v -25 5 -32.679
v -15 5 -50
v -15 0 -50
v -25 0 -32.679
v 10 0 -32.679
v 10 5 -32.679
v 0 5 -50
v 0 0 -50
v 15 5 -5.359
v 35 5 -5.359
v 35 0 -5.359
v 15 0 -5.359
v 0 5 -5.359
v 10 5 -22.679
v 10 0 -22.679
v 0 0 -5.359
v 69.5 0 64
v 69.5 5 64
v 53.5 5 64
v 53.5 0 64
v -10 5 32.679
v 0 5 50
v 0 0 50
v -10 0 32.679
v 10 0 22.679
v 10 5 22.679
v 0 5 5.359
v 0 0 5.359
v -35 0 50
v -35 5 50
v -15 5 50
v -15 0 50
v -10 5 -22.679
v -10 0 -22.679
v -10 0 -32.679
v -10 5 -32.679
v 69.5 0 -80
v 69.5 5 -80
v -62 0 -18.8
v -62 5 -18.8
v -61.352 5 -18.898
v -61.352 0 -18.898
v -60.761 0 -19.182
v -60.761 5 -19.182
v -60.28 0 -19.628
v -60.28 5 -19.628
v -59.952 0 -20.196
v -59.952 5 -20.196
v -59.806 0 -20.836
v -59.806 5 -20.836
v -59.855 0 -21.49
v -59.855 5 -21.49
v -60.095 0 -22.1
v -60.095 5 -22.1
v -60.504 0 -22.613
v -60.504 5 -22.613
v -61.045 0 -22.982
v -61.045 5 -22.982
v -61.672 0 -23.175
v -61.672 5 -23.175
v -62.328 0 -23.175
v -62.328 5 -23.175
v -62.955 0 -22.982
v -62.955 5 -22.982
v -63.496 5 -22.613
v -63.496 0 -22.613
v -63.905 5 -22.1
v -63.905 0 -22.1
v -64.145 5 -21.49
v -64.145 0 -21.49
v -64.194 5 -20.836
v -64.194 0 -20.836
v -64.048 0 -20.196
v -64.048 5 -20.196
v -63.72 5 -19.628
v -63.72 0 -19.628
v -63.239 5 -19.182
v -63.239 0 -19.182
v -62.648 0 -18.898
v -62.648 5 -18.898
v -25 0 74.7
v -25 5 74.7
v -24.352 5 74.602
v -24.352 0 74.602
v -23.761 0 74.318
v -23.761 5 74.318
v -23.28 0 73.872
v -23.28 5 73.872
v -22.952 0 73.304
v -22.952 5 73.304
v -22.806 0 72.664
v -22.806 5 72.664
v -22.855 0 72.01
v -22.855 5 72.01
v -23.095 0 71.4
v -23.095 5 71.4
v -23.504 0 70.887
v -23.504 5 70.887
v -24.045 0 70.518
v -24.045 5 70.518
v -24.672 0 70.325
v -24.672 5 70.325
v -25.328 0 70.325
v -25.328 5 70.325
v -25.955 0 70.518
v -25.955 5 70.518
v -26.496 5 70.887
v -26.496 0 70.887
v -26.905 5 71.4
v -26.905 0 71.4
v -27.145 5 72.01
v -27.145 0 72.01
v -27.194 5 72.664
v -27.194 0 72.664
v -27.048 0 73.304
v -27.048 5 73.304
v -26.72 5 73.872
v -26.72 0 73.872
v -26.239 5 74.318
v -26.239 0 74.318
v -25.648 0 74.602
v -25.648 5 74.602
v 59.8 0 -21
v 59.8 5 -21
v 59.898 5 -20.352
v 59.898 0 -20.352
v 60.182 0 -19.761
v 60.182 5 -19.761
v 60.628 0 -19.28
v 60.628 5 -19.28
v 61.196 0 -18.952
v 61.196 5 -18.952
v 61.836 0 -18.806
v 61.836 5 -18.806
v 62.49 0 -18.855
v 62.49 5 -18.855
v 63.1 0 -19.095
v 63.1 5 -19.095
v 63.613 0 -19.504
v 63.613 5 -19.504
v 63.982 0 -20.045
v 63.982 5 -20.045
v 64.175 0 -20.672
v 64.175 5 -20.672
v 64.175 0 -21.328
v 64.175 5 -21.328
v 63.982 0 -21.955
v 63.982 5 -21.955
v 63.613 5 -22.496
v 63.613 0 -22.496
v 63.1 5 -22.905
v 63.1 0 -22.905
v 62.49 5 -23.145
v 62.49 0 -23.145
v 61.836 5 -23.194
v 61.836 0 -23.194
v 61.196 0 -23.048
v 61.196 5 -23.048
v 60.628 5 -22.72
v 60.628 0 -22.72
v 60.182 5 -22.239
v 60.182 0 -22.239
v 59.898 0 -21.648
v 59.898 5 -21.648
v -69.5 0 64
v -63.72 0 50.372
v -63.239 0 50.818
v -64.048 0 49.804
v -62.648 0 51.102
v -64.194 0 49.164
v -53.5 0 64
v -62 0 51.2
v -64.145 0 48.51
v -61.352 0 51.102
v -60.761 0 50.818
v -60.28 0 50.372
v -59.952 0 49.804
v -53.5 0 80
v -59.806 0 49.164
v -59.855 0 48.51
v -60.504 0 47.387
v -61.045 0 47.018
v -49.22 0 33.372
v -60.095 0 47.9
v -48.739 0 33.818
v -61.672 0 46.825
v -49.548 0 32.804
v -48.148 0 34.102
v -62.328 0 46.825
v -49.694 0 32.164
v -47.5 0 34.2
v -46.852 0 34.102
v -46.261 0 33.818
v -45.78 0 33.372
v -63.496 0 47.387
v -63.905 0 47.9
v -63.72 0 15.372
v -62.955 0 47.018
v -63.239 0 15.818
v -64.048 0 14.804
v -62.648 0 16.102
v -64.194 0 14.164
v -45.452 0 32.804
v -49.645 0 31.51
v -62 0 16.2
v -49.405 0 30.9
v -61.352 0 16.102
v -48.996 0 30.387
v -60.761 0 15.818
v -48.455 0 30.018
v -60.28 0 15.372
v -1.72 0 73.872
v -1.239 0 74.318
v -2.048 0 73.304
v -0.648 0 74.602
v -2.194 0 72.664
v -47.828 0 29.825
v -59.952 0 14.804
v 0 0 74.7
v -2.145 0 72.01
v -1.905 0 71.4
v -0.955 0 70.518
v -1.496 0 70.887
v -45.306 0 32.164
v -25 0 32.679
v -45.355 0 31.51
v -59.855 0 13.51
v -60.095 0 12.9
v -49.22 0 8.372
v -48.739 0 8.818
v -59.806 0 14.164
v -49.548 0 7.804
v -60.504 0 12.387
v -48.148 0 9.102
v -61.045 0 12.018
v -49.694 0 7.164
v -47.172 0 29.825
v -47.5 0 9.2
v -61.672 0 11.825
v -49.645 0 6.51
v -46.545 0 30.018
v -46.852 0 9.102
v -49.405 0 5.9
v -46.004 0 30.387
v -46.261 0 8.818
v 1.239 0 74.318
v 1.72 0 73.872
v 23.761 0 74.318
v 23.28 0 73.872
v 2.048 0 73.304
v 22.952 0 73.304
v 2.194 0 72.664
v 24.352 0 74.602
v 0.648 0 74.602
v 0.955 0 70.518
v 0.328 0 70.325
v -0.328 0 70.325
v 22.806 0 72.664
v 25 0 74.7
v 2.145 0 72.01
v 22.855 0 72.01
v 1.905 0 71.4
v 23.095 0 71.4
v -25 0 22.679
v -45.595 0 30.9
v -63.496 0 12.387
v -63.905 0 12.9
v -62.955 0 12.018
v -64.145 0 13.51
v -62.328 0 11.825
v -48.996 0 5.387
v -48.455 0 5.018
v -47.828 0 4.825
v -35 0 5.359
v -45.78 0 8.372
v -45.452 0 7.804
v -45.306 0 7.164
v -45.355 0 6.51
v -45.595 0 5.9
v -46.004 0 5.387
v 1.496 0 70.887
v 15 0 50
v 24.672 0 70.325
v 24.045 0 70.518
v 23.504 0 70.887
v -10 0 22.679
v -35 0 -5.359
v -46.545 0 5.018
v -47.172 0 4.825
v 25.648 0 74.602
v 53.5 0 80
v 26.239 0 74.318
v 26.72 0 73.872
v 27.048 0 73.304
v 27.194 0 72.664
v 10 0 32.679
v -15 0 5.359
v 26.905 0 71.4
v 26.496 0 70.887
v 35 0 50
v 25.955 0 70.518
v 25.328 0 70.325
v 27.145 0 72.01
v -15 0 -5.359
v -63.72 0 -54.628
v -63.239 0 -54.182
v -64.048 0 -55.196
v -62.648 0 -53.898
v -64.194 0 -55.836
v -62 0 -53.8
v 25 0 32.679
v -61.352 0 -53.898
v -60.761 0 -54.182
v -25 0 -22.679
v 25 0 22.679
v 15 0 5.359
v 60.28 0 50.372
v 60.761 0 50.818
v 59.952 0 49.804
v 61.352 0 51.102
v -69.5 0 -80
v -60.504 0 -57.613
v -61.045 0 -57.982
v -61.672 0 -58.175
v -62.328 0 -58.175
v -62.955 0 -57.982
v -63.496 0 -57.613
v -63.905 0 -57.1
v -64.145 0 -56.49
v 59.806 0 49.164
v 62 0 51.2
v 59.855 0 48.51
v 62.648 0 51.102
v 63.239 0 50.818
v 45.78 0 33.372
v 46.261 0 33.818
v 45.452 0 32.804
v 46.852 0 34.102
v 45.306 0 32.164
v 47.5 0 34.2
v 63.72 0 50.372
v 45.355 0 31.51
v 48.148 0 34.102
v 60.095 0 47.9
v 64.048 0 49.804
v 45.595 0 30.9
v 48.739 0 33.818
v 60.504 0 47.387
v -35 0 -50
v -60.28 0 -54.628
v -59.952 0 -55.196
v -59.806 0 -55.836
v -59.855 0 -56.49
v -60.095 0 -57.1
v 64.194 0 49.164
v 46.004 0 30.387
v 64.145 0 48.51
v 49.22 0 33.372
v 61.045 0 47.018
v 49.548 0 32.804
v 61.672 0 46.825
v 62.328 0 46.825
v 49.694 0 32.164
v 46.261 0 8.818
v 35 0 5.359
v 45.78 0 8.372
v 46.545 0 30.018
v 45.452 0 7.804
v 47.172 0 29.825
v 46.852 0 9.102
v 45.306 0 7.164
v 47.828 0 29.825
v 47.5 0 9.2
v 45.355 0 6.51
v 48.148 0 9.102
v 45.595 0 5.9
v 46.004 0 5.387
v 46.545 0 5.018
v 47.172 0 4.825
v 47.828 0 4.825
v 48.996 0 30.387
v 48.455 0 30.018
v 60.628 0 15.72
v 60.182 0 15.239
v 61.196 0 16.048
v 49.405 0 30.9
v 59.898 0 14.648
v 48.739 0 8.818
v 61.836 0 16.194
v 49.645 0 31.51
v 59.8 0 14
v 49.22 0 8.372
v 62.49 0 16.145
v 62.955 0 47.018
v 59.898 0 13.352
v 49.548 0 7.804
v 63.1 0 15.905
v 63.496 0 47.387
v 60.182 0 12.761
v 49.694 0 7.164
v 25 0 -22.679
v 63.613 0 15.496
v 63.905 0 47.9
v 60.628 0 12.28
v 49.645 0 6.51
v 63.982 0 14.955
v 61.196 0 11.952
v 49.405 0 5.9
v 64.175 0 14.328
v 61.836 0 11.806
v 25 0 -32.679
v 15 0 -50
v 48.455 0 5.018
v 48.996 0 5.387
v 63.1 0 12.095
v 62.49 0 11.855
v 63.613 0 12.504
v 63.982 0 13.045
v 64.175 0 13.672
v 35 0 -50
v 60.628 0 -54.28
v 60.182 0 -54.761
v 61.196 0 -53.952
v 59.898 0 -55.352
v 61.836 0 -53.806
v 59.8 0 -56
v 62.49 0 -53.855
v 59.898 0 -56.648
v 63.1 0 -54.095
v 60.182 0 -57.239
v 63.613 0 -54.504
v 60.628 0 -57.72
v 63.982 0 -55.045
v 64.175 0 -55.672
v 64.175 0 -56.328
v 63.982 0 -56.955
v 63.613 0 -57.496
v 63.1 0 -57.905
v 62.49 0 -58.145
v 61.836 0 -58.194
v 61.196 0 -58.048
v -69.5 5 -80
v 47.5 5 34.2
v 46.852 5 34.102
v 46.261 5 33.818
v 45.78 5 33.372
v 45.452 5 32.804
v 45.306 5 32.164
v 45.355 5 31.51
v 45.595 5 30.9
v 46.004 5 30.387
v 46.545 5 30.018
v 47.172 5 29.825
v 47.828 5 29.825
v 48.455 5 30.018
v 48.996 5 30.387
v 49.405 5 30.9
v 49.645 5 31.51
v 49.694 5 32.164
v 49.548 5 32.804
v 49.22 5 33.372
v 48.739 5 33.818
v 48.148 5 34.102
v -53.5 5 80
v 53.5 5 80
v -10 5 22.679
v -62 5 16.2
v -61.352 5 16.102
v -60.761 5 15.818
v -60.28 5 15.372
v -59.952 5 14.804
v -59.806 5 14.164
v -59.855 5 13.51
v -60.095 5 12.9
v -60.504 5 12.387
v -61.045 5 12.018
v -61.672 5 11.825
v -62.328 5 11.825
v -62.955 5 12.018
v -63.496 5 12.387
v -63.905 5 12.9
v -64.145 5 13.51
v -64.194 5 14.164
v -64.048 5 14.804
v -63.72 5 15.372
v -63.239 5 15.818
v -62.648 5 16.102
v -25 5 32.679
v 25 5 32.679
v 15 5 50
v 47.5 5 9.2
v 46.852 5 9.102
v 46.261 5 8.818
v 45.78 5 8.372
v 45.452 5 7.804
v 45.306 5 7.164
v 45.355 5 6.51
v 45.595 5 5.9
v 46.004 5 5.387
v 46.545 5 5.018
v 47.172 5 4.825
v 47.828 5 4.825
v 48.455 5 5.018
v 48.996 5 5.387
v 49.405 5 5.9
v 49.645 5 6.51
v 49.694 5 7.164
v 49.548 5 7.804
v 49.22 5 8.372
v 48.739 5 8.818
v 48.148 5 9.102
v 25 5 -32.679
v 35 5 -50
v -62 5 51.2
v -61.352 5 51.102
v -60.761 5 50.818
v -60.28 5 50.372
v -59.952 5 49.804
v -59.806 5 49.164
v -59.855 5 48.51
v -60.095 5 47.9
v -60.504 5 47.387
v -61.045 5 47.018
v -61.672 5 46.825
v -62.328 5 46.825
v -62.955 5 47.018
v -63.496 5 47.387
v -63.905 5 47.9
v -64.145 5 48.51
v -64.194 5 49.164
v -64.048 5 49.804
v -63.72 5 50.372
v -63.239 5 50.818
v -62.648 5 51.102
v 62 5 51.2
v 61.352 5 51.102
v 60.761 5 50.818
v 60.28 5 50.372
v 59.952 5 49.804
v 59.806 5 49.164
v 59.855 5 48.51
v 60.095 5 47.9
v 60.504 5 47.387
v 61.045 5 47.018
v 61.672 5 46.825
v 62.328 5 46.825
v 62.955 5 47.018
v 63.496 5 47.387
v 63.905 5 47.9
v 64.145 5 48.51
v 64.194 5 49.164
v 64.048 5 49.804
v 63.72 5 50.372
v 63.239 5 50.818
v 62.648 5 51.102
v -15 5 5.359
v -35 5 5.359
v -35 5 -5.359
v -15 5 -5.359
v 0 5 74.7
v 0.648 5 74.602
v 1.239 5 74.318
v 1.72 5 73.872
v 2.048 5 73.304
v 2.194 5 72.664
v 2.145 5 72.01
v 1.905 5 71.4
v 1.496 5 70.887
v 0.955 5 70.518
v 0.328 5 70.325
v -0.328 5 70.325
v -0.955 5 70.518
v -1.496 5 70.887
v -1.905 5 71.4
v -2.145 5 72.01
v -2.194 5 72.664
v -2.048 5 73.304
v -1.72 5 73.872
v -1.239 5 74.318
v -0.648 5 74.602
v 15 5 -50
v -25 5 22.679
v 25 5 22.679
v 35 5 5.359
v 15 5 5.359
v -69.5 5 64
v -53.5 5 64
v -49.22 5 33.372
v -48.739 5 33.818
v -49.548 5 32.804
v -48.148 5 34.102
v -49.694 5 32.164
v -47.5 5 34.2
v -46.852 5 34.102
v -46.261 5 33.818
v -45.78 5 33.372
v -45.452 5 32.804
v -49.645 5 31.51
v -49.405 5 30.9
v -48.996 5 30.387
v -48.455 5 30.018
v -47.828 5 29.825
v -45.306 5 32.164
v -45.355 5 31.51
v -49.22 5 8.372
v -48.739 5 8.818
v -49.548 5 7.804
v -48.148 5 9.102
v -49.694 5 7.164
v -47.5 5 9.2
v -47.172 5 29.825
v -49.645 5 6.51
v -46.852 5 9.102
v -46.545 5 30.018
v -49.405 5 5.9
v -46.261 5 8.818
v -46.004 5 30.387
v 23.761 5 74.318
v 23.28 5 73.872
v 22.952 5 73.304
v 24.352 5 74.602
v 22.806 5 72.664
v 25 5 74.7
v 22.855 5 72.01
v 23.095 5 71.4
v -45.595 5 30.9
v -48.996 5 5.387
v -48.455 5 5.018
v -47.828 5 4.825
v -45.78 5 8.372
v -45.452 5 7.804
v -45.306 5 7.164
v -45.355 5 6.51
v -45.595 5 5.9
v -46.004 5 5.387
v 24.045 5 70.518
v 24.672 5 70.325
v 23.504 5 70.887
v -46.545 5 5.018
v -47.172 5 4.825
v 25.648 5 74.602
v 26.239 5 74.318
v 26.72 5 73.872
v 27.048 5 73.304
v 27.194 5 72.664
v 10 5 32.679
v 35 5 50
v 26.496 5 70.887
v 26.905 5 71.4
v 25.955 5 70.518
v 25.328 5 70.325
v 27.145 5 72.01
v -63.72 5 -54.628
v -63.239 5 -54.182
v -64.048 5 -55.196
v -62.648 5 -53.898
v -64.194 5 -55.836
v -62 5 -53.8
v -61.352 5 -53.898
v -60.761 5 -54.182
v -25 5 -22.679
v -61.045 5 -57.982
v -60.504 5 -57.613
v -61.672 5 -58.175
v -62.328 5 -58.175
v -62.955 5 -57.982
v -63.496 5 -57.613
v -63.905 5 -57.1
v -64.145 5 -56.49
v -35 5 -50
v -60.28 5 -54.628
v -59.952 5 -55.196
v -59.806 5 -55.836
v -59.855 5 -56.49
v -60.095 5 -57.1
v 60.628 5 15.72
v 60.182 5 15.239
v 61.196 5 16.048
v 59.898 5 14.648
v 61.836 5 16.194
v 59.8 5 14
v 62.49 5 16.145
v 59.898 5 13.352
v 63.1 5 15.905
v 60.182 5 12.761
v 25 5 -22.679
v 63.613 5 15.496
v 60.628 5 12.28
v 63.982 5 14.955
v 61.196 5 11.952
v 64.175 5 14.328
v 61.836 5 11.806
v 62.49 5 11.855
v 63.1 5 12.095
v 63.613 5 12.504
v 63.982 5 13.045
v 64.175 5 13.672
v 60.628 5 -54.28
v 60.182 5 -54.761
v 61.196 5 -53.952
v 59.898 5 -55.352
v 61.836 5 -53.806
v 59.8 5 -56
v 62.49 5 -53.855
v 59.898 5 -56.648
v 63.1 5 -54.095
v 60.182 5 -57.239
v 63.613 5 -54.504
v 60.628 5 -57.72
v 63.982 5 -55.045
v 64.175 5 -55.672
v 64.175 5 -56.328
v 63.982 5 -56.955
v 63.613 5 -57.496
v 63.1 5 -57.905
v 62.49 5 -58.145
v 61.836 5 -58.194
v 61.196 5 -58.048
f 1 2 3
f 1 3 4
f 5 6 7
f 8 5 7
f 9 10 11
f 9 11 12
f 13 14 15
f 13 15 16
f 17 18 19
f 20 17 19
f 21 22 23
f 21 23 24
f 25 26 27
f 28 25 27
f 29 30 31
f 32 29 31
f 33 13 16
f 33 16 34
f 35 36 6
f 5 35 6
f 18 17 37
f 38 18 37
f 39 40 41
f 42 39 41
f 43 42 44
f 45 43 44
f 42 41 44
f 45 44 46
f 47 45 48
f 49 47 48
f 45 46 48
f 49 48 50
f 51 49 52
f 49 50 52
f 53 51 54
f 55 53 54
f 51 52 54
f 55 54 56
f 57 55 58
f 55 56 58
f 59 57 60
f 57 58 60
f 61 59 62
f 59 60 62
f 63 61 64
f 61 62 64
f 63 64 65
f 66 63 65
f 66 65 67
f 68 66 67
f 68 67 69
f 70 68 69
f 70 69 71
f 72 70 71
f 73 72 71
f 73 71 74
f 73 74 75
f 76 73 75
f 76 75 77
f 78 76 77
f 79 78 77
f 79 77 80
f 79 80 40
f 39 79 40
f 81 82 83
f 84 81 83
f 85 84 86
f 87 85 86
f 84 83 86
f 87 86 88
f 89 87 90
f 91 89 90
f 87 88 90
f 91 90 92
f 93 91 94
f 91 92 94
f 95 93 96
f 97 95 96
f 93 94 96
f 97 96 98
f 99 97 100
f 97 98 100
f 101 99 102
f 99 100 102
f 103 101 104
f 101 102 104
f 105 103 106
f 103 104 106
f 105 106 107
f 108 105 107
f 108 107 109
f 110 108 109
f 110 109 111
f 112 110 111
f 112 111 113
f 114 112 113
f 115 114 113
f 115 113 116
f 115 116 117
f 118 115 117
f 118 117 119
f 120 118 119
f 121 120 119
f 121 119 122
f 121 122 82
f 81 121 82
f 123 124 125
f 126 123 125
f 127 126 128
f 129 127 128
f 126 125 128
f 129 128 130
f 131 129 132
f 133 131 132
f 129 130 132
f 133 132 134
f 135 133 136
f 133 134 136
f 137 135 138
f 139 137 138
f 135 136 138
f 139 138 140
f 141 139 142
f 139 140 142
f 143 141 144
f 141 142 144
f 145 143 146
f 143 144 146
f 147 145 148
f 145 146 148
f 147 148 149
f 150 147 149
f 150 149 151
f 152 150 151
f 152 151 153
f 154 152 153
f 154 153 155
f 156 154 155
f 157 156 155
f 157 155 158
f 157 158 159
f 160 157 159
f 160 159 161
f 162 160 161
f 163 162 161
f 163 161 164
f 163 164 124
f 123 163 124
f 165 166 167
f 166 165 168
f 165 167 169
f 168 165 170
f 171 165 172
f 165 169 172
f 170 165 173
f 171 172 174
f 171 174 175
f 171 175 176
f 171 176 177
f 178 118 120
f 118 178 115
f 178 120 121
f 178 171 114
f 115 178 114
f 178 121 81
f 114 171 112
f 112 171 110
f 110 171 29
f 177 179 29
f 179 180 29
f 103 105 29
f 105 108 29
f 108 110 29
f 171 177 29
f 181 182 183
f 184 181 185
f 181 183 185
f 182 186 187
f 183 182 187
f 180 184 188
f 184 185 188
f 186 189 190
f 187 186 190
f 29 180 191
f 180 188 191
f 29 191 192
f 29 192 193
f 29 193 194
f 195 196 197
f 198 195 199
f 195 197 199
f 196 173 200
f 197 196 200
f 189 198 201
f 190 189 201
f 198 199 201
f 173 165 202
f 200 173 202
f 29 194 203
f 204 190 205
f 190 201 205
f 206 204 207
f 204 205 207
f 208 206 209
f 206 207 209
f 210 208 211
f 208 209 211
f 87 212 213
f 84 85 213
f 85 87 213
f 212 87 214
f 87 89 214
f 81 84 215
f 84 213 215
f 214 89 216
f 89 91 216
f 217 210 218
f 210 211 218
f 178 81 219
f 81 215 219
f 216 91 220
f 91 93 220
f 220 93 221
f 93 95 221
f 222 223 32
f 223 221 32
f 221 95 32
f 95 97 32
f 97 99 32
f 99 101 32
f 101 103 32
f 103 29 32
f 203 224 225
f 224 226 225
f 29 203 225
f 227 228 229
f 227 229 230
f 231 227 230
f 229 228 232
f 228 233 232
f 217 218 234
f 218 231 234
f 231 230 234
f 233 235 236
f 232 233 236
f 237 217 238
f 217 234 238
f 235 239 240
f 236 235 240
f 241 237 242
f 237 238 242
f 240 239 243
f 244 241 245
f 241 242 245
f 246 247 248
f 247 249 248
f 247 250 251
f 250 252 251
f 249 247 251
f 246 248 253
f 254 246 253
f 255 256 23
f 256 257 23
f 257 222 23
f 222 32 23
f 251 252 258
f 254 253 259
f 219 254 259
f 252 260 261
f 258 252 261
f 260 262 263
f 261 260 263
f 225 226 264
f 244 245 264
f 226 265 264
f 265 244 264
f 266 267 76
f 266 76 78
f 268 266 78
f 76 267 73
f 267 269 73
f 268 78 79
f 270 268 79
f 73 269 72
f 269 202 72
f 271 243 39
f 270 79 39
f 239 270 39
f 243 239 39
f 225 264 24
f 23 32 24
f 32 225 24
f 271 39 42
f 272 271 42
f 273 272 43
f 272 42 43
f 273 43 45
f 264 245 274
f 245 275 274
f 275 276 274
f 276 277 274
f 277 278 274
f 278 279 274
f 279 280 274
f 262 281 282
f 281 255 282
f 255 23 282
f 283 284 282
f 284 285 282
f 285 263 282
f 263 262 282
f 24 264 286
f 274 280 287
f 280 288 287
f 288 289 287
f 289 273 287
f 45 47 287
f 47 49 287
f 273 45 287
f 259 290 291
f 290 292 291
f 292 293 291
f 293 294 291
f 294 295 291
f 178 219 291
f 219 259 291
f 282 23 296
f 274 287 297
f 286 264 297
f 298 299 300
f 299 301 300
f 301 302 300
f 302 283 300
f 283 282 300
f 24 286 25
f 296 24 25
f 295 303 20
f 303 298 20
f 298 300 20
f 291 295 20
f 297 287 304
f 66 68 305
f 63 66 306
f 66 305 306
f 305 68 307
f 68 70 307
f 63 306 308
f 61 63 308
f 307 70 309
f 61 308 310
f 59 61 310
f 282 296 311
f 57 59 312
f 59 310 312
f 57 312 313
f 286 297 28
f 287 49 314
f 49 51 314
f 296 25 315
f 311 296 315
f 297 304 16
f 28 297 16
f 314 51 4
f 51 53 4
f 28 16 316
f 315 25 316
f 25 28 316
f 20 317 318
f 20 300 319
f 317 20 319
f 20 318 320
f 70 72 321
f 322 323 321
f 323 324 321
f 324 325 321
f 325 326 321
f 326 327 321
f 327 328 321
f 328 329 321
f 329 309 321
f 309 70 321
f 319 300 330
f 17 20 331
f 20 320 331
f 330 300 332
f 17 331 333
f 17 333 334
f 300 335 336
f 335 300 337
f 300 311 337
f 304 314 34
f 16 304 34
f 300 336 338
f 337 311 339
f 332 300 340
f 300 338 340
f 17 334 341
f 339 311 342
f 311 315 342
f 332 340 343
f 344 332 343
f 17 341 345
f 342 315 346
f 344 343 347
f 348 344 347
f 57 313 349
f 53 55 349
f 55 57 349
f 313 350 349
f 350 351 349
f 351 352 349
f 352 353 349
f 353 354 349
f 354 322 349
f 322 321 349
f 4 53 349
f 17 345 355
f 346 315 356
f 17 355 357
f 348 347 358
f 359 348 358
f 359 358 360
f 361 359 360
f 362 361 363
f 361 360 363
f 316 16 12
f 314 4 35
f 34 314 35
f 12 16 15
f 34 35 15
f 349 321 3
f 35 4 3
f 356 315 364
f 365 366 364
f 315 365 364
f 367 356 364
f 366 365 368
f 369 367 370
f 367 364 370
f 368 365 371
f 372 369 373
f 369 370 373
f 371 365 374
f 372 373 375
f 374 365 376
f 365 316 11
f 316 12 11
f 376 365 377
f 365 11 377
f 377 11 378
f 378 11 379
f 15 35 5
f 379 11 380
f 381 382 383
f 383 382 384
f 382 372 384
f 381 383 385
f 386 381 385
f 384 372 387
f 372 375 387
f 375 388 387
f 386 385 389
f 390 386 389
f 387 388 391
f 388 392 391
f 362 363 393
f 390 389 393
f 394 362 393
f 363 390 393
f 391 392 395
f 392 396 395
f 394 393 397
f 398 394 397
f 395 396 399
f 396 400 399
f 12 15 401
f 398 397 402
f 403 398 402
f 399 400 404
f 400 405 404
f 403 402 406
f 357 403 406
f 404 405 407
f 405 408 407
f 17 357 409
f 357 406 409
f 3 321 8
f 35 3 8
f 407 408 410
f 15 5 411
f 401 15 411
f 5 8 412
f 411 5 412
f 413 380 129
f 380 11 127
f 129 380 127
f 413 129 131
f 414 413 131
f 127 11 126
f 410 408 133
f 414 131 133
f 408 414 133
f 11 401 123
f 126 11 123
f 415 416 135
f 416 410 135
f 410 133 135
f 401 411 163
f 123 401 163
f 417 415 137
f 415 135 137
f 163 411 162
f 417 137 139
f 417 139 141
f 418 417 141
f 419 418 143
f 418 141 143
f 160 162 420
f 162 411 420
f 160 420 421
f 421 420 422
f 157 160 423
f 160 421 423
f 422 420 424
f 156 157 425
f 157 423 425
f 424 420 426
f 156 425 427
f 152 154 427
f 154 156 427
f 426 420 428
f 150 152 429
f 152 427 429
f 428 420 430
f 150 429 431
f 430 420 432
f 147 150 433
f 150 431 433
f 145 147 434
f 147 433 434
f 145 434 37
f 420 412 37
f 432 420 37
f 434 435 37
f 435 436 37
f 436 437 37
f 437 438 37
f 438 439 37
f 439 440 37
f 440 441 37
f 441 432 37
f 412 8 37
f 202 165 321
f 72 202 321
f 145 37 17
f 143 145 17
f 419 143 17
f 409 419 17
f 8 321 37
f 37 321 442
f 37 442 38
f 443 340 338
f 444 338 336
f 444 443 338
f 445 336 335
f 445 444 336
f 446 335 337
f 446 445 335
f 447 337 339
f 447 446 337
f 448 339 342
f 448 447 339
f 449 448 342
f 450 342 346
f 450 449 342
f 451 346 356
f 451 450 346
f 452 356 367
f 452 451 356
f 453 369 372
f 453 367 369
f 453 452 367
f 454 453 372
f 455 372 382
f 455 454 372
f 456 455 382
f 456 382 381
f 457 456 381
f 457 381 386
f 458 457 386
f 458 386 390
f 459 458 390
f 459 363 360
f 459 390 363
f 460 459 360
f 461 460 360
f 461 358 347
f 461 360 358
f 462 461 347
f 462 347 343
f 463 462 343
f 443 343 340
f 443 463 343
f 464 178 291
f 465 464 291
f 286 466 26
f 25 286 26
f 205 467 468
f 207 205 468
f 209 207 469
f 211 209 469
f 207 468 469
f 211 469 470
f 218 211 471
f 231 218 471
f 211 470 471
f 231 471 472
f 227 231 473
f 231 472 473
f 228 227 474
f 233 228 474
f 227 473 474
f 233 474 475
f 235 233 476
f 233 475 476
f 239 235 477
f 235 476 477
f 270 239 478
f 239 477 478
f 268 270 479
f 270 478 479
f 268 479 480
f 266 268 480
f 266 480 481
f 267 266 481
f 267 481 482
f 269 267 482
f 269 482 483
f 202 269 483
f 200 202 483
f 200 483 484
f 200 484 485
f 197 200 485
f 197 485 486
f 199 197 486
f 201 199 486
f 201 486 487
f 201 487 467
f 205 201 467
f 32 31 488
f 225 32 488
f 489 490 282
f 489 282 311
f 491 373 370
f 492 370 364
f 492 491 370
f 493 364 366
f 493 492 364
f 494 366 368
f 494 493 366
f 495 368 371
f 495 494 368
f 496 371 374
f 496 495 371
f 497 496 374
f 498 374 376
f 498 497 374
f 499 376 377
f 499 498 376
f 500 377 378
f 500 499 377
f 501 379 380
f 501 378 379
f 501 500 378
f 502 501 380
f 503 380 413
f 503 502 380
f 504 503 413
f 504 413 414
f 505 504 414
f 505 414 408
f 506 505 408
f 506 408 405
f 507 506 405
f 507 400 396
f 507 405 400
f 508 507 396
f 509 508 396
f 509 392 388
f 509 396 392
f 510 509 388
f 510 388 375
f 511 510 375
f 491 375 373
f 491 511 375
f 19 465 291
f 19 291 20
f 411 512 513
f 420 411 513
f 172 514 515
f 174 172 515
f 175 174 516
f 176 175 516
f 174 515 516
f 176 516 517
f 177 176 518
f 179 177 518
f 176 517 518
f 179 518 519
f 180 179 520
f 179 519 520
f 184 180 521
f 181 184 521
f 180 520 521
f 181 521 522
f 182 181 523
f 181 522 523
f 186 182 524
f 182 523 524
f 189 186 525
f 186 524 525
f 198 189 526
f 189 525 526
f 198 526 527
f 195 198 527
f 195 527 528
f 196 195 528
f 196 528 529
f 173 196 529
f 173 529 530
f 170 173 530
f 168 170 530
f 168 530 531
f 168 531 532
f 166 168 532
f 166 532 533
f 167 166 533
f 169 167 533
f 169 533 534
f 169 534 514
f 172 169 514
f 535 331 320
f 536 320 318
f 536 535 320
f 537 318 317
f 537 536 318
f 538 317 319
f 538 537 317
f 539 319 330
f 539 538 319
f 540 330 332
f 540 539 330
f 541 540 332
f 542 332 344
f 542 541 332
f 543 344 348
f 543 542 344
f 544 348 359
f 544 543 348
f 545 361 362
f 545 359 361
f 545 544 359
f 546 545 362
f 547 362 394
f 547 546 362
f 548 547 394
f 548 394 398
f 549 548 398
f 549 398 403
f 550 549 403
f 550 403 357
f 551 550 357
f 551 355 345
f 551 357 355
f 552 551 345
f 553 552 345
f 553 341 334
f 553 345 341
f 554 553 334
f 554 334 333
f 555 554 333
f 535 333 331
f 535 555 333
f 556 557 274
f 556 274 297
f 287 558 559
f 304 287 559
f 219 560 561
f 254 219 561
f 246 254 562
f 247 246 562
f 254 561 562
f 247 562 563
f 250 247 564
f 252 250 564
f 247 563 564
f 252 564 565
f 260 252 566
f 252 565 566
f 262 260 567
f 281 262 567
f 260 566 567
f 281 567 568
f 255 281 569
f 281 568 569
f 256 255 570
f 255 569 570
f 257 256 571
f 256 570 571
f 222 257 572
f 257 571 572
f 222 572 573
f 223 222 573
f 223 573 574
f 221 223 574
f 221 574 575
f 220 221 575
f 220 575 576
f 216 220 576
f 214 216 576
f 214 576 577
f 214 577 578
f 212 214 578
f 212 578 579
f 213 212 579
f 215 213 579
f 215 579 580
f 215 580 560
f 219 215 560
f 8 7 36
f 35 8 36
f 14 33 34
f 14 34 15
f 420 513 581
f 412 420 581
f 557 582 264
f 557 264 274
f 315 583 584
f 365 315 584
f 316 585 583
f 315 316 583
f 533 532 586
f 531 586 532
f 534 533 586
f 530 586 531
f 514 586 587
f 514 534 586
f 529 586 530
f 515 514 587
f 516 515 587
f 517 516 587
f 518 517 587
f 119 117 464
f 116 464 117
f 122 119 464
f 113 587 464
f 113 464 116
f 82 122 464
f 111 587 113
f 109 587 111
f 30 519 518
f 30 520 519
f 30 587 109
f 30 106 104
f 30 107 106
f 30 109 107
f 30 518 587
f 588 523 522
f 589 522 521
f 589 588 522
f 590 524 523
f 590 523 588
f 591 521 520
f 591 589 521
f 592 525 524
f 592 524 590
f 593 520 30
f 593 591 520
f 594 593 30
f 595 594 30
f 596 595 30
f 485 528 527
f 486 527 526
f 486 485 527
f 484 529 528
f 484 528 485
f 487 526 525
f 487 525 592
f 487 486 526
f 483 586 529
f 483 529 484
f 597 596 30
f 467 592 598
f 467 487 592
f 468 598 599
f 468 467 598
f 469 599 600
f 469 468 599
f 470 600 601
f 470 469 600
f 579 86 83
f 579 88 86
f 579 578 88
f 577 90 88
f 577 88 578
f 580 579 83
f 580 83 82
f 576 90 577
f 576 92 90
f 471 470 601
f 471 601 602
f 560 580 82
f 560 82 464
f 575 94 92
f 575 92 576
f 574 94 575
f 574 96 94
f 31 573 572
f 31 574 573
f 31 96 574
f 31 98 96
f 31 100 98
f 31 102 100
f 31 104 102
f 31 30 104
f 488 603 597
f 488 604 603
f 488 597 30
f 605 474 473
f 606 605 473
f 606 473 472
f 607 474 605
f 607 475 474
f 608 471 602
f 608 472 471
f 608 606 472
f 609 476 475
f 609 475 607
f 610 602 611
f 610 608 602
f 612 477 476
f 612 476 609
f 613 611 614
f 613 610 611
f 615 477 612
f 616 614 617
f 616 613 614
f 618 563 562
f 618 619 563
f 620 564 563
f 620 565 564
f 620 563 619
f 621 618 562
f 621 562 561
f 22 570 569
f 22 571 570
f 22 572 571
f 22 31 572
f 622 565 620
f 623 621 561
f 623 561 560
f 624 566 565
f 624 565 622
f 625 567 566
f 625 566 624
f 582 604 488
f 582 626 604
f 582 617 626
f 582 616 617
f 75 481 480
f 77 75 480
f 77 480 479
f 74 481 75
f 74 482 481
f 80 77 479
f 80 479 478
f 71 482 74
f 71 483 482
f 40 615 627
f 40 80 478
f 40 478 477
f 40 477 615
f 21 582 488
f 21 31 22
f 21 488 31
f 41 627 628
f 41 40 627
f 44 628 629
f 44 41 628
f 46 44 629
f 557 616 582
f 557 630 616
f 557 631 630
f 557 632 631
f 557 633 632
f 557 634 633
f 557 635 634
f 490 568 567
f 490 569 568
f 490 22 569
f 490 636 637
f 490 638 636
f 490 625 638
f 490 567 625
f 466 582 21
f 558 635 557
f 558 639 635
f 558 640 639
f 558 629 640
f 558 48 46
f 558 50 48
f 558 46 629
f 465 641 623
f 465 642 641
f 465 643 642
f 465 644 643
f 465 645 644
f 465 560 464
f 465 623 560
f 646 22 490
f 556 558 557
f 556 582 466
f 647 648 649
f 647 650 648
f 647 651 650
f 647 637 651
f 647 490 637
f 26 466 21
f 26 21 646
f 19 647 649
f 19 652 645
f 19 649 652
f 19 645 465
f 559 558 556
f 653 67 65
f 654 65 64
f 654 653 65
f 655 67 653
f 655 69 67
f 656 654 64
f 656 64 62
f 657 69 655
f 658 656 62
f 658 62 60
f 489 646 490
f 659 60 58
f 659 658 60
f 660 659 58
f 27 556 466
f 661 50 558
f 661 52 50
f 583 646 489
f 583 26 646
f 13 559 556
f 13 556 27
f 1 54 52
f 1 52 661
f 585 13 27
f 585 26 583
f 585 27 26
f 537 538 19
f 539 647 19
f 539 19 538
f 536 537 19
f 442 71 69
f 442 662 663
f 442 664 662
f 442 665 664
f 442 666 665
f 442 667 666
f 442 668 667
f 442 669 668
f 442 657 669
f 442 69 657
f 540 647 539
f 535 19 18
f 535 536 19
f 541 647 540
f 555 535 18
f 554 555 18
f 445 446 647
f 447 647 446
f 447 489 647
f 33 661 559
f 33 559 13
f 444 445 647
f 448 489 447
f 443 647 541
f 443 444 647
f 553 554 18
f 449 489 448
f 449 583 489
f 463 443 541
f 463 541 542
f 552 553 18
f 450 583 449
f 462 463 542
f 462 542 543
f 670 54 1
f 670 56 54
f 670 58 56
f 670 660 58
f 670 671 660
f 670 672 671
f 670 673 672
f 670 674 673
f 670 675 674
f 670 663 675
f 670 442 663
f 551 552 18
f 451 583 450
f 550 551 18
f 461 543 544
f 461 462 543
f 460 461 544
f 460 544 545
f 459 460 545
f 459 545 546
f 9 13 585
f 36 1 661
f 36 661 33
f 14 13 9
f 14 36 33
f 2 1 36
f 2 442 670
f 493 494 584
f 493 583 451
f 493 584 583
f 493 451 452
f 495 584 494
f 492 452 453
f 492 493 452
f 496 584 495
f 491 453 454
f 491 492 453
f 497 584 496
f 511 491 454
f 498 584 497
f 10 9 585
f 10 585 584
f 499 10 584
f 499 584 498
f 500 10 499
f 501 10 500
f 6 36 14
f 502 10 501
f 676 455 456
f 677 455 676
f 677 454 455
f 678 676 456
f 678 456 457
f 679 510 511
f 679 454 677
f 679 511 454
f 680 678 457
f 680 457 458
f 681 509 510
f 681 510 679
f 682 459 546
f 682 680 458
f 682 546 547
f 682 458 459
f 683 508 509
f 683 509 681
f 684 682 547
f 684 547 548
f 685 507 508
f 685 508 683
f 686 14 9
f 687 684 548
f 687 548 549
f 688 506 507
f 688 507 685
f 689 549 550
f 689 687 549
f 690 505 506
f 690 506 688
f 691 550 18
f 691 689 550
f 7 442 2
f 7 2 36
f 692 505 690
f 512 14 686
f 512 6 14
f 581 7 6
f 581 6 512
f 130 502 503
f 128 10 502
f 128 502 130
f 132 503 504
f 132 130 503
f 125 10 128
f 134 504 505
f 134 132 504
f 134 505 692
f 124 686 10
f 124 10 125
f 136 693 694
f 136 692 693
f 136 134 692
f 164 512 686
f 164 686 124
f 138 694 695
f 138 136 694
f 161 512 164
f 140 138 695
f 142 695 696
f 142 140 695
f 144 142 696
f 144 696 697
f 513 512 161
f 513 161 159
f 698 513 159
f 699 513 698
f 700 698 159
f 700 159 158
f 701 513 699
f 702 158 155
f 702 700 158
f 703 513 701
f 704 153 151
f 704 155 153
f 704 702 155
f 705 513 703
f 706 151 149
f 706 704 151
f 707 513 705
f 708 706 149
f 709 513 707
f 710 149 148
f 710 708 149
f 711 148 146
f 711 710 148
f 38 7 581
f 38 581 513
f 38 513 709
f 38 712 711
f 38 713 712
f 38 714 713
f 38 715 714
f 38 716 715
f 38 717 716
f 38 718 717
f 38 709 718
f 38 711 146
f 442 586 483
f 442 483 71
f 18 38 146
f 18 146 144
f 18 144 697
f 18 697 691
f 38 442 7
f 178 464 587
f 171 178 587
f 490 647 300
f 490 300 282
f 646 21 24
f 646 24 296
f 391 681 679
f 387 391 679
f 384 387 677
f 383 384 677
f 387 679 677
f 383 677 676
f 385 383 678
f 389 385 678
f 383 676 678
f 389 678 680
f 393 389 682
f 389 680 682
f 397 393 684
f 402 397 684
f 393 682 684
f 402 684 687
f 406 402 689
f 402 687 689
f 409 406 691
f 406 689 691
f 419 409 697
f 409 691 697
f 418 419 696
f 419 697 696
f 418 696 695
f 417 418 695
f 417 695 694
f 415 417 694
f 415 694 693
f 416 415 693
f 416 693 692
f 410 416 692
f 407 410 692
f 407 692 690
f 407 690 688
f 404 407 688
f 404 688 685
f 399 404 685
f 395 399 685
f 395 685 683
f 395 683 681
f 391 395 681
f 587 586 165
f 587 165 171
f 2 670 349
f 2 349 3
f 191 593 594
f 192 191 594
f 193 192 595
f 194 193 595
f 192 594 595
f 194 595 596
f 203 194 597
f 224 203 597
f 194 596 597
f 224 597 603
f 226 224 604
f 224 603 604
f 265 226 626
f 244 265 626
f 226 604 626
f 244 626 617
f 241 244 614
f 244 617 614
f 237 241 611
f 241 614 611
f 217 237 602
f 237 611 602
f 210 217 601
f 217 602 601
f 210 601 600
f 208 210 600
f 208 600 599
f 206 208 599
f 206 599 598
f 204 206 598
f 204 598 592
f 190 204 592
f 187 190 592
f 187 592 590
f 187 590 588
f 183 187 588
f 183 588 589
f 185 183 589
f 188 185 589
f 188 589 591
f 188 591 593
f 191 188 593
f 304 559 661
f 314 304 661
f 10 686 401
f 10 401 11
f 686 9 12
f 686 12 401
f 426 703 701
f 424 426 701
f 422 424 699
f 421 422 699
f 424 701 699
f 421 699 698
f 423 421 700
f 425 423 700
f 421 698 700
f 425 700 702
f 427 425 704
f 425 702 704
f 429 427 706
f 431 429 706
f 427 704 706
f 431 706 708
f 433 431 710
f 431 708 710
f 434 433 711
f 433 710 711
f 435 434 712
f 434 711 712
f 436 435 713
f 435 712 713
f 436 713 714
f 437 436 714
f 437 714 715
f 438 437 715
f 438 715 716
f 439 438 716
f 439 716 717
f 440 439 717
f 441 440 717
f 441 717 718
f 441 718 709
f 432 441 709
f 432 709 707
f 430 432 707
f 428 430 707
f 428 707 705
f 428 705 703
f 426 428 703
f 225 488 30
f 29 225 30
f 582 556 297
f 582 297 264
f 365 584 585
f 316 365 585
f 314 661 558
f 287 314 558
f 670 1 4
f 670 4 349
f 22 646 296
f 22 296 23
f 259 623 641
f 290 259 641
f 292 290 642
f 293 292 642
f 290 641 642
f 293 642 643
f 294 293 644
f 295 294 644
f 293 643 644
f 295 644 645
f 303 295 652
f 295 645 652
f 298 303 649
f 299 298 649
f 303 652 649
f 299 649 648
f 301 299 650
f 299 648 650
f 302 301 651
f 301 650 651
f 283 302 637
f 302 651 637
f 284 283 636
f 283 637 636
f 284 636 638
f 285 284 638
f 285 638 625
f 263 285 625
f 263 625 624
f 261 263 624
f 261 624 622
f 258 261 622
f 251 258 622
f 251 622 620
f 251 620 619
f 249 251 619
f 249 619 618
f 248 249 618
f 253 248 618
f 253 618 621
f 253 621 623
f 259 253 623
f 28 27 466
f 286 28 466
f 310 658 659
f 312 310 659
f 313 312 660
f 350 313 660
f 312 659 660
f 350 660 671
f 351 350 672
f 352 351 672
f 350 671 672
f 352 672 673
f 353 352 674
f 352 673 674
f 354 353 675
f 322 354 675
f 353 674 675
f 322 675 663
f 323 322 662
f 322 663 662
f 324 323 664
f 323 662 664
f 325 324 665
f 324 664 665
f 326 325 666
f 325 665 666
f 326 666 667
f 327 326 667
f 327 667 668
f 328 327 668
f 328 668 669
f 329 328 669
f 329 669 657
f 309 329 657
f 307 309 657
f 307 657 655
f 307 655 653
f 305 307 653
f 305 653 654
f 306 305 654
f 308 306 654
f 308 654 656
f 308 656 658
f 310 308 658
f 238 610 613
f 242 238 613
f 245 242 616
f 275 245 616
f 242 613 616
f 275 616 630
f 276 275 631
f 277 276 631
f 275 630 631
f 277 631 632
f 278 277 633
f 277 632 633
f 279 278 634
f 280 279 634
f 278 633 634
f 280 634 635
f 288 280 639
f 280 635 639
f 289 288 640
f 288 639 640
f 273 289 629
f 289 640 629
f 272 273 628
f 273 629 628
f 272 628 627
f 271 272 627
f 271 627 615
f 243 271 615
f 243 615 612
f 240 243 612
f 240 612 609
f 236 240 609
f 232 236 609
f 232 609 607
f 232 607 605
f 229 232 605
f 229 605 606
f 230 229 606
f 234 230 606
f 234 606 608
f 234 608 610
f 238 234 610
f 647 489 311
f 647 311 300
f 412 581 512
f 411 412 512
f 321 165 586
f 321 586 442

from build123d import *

# Parameters (mm, degrees)
SKETCH1_W               = 139
SKETCH1_H               = 160
BOSS_EXTRUDE1_DEPTH     = 5
SKETCH2_W               = 16
SKETCH2_H               = 16
CUT_EXTRUDE1_DEPTH      = 107.090763029
SKETCH3_R               = 2.2
CUT_EXTRUDE2_DEPTH      = 107.090763029
SKETCH4_R               = 2.2
CUT_EXTRUDE3_DEPTH      = 107.090763029
LPATTERN1_COUNT         = 4
LPATTERN1_PITCH         = 35
MIRROR2_COPY_1_SKETCH_R = 2.2
MIRROR2_COPY_1_DEPTH    = 107.090763029
MIRROR2_COPY_2_SKETCH_R = 2.2
MIRROR2_COPY_2_DEPTH    = 107.090763029
MIRROR2_COPY_3_SKETCH_R = 2.2
MIRROR2_COPY_3_DEPTH    = 107.090763029
SKETCH5_R               = 2.2
CUT_EXTRUDE4_DEPTH      = 107.090763029
CUT_EXTRUDE5_DEPTH      = 107.090763029


with BuildPart() as part:
    # Sketch1 → Boss-Extrude1 (new body)
    with BuildSketch(Plane(origin=(0, 0, 0), x_dir=(1, 0, 0), z_dir=(0, 1, 0))):
        Rectangle(SKETCH1_W, SKETCH1_H)
    extrude(amount=BOSS_EXTRUDE1_DEPTH)

    # Sketch2 → Cut-Extrude1 (cut, through all)
    with BuildSketch(Plane(origin=(0, 5, 0), x_dir=(1, 0, 0), z_dir=(0, 1, 0))):
        with Locations((-61.5, -72)):
            Rectangle(SKETCH2_W, SKETCH2_H)
    cut_extrude1 = extrude(amount=-CUT_EXTRUDE1_DEPTH, mode=Mode.SUBTRACT)

    # Mirror1: Cut-Extrude1 across plane
    add(cut_extrude1.mirror(Plane(origin=(0, 0, 0), x_dir=(0, 0, 1), z_dir=(1, 0, 0))), mode=Mode.SUBTRACT)

    # Sketch3 → Cut-Extrude2 (cut, through all)
    with BuildSketch(Plane(origin=(0, 5, 0), x_dir=(1, 0, 0), z_dir=(0, 1, 0))):
        with Locations(Location((0, -72.5, 0), (0, 0, 270))):
            Circle(SKETCH3_R)
        with Locations(Location((-25, -72.5, 0), (0, 0, 270))):
            Circle(SKETCH3_R)
        with Locations(Location((25, -72.5, 0), (0, 0, 270))):
            Circle(SKETCH3_R)
    extrude(amount=-CUT_EXTRUDE2_DEPTH, mode=Mode.SUBTRACT)

    # Sketch4 → Cut-Extrude3 (cut, through all)
    with BuildSketch(Plane(origin=(0, 5, 0), x_dir=(1, 0, 0), z_dir=(0, 1, 0))):
        with Locations(Location((-62, -49, 0), (0, 0, 270))):
            Circle(SKETCH4_R)
    cut_extrude3 = extrude(amount=-CUT_EXTRUDE3_DEPTH, mode=Mode.SUBTRACT)

    # LPattern1: Cut-Extrude3 ×4
    with Locations(*[(0, 0, -i * LPATTERN1_PITCH) for i in range(1, LPATTERN1_COUNT)]):
        add(cut_extrude3, mode=Mode.SUBTRACT)

    # Mirror2: Cut-Extrude3 across plane
    add(cut_extrude3.mirror(Plane(origin=(0, 0, 0), x_dir=(0, 0, 1), z_dir=(1, 0, 0))), mode=Mode.SUBTRACT)

    # Mirror2 copy 1 sketch → Mirror2 copy 1 (cut, through all)
    with BuildSketch(Plane(origin=(0, 5, -35), x_dir=(-1, 0, 0), z_dir=(0, 1, 0))):
        with Locations((-62, 49)):
            Circle(MIRROR2_COPY_1_SKETCH_R)
    extrude(amount=-MIRROR2_COPY_1_DEPTH, mode=Mode.SUBTRACT)

    # Mirror2 copy 2 sketch → Mirror2 copy 2 (cut, through all)
    with BuildSketch(Plane(origin=(0, 5, -70), x_dir=(-1, 0, 0), z_dir=(0, 1, 0))):
        with Locations((-62, 49)):
            Circle(MIRROR2_COPY_2_SKETCH_R)
    extrude(amount=-MIRROR2_COPY_2_DEPTH, mode=Mode.SUBTRACT)

    # Mirror2 copy 3 sketch → Mirror2 copy 3 (cut, through all)
    with BuildSketch(Plane(origin=(0, 5, -105), x_dir=(-1, 0, 0), z_dir=(0, 1, 0))):
        with Locations((-62, 49)):
            Circle(MIRROR2_COPY_3_SKETCH_R)
    extrude(amount=-MIRROR2_COPY_3_DEPTH, mode=Mode.SUBTRACT)

    # Sketch5 → Cut-Extrude4 (cut, through all)
    with BuildSketch(Plane(origin=(0, 5, 0), x_dir=(1, 0, 0), z_dir=(0, 1, 0))):
        with Locations(Location((-47.5, -32, 0), (0, 0, 270))):
            Circle(SKETCH5_R)
        with Locations(Location((-47.5, -7, 0), (0, 0, 270))):
            Circle(SKETCH5_R)
    cut_extrude4 = extrude(amount=-CUT_EXTRUDE4_DEPTH, mode=Mode.SUBTRACT)

    # Mirror3: Cut-Extrude4 across plane
    add(cut_extrude4.mirror(Plane(origin=(0, 0, 0), x_dir=(0, 0, 1), z_dir=(1, 0, 0))), mode=Mode.SUBTRACT)

    # Sketch6 → Cut-Extrude5 (cut, through all)
    with BuildSketch(Plane(origin=(0, 5, 0), x_dir=(1, 0, 0), z_dir=(0, 1, 0))):
        Polygon((0, 50), (-10, 32.679491924), (10, 32.679491924), align=None)
        Polygon((15, 50), (25, 32.679491924), (35, 50), align=None)
        Polygon((-25, 32.679491924), (-35, 50), (-15, 50), align=None)
        Polygon((25, 22.679491924), (35, 5.358983849), (15, 5.358983849), align=None)
        Polygon((-10, 22.679491924), (10, 22.679491924), (0, 5.358983849), align=None)
        Polygon((-15, 5.358983849), (-25, 22.679491924), (-35, 5.358983849), align=None)
        Polygon((15, -5.358983849), (25, -22.679491924), (35, -5.358983849), align=None)
        Polygon((0, -5.358983849), (-10, -22.679491924), (10, -22.679491924), align=None)
        Polygon((-35, -5.358983849), (-15, -5.358983849), (-25, -22.679491924), align=None)
        Polygon((25, -32.679491924), (35, -50), (15, -50), align=None)
        Polygon((-10, -32.679491924), (10, -32.679491924), (0, -50), align=None)
        Polygon((-15, -50), (-25, -32.679491924), (-35, -50), align=None)
    extrude(amount=-CUT_EXTRUDE5_DEPTH, mode=Mode.SUBTRACT)


solid = part.part
